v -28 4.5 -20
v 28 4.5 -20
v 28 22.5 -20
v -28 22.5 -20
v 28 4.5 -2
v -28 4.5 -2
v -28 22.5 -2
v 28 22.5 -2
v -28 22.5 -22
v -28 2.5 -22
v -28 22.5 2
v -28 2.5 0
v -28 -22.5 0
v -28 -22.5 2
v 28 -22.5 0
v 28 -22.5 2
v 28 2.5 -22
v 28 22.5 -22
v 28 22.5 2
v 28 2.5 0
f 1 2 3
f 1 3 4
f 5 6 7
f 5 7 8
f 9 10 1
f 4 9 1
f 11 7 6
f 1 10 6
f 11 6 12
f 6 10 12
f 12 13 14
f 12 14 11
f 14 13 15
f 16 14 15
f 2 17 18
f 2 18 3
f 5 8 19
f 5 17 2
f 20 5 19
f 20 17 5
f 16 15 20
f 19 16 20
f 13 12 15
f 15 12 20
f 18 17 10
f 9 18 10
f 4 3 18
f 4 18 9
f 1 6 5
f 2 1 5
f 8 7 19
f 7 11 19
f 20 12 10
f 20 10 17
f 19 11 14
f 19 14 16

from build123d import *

# Parameters (mm, degrees)
F0_W      = 56
F0_H      = 45
F1_DEPTH  = 2
F2_W      = 56
F2_H      = 20
F3_DEPTH  = 2
F4_W      = 56
F4_H      = 2
F5_DEPTH  = 20
F6_W      = 56
F6_H      = 2
F7_DEPTH  = 20
F9_W      = 69.615941
F9_H      = 33.992227
F10_DEPTH = 25


with BuildPart() as f1:
    # F0 (on Top) → F1 (new body)
    with BuildSketch(Plane.XY):
        Rectangle(F0_W, F0_H)
    extrude(amount=F1_DEPTH)

    # F2 (on face) → F3 (join)
    with BuildSketch(Plane(origin=(0, 0, 0), x_dir=(1, 0, 0), z_dir=(0, 0, -1))):
        with Locations((0, -12.5)):
            Rectangle(F2_W, F2_H)
    extrude(amount=F3_DEPTH)

    # F4 (on face) → F5 (join)
    with BuildSketch(Plane(origin=(0, 0, -2), x_dir=(1, 0, 0), z_dir=(0, 0, -1))):
        with Locations((0, -3.5)):
            Rectangle(F4_W, F4_H)
    extrude(amount=F5_DEPTH)

    # F6 (on face) → F7 (join)
    with BuildSketch(Plane(origin=(0, 4.5, 0), x_dir=(-1, 0, 0), z_dir=(0, 1, 0))):
        with Locations((0, -21)):
            Rectangle(F6_W, F6_H)
    extrude(amount=F7_DEPTH)

    # F9 (on offset) → F10 (cut)
    with BuildSketch(Plane(origin=(0, 22.5, 0), x_dir=(-1, 0, 0), z_dir=(0, 1, 0))):
        with Locations((-4.858752, -12.837998)):
            Rectangle(F9_W, F9_H)
    extrude(amount=F10_DEPTH, mode=Mode.SUBTRACT)


solid = f1.part
